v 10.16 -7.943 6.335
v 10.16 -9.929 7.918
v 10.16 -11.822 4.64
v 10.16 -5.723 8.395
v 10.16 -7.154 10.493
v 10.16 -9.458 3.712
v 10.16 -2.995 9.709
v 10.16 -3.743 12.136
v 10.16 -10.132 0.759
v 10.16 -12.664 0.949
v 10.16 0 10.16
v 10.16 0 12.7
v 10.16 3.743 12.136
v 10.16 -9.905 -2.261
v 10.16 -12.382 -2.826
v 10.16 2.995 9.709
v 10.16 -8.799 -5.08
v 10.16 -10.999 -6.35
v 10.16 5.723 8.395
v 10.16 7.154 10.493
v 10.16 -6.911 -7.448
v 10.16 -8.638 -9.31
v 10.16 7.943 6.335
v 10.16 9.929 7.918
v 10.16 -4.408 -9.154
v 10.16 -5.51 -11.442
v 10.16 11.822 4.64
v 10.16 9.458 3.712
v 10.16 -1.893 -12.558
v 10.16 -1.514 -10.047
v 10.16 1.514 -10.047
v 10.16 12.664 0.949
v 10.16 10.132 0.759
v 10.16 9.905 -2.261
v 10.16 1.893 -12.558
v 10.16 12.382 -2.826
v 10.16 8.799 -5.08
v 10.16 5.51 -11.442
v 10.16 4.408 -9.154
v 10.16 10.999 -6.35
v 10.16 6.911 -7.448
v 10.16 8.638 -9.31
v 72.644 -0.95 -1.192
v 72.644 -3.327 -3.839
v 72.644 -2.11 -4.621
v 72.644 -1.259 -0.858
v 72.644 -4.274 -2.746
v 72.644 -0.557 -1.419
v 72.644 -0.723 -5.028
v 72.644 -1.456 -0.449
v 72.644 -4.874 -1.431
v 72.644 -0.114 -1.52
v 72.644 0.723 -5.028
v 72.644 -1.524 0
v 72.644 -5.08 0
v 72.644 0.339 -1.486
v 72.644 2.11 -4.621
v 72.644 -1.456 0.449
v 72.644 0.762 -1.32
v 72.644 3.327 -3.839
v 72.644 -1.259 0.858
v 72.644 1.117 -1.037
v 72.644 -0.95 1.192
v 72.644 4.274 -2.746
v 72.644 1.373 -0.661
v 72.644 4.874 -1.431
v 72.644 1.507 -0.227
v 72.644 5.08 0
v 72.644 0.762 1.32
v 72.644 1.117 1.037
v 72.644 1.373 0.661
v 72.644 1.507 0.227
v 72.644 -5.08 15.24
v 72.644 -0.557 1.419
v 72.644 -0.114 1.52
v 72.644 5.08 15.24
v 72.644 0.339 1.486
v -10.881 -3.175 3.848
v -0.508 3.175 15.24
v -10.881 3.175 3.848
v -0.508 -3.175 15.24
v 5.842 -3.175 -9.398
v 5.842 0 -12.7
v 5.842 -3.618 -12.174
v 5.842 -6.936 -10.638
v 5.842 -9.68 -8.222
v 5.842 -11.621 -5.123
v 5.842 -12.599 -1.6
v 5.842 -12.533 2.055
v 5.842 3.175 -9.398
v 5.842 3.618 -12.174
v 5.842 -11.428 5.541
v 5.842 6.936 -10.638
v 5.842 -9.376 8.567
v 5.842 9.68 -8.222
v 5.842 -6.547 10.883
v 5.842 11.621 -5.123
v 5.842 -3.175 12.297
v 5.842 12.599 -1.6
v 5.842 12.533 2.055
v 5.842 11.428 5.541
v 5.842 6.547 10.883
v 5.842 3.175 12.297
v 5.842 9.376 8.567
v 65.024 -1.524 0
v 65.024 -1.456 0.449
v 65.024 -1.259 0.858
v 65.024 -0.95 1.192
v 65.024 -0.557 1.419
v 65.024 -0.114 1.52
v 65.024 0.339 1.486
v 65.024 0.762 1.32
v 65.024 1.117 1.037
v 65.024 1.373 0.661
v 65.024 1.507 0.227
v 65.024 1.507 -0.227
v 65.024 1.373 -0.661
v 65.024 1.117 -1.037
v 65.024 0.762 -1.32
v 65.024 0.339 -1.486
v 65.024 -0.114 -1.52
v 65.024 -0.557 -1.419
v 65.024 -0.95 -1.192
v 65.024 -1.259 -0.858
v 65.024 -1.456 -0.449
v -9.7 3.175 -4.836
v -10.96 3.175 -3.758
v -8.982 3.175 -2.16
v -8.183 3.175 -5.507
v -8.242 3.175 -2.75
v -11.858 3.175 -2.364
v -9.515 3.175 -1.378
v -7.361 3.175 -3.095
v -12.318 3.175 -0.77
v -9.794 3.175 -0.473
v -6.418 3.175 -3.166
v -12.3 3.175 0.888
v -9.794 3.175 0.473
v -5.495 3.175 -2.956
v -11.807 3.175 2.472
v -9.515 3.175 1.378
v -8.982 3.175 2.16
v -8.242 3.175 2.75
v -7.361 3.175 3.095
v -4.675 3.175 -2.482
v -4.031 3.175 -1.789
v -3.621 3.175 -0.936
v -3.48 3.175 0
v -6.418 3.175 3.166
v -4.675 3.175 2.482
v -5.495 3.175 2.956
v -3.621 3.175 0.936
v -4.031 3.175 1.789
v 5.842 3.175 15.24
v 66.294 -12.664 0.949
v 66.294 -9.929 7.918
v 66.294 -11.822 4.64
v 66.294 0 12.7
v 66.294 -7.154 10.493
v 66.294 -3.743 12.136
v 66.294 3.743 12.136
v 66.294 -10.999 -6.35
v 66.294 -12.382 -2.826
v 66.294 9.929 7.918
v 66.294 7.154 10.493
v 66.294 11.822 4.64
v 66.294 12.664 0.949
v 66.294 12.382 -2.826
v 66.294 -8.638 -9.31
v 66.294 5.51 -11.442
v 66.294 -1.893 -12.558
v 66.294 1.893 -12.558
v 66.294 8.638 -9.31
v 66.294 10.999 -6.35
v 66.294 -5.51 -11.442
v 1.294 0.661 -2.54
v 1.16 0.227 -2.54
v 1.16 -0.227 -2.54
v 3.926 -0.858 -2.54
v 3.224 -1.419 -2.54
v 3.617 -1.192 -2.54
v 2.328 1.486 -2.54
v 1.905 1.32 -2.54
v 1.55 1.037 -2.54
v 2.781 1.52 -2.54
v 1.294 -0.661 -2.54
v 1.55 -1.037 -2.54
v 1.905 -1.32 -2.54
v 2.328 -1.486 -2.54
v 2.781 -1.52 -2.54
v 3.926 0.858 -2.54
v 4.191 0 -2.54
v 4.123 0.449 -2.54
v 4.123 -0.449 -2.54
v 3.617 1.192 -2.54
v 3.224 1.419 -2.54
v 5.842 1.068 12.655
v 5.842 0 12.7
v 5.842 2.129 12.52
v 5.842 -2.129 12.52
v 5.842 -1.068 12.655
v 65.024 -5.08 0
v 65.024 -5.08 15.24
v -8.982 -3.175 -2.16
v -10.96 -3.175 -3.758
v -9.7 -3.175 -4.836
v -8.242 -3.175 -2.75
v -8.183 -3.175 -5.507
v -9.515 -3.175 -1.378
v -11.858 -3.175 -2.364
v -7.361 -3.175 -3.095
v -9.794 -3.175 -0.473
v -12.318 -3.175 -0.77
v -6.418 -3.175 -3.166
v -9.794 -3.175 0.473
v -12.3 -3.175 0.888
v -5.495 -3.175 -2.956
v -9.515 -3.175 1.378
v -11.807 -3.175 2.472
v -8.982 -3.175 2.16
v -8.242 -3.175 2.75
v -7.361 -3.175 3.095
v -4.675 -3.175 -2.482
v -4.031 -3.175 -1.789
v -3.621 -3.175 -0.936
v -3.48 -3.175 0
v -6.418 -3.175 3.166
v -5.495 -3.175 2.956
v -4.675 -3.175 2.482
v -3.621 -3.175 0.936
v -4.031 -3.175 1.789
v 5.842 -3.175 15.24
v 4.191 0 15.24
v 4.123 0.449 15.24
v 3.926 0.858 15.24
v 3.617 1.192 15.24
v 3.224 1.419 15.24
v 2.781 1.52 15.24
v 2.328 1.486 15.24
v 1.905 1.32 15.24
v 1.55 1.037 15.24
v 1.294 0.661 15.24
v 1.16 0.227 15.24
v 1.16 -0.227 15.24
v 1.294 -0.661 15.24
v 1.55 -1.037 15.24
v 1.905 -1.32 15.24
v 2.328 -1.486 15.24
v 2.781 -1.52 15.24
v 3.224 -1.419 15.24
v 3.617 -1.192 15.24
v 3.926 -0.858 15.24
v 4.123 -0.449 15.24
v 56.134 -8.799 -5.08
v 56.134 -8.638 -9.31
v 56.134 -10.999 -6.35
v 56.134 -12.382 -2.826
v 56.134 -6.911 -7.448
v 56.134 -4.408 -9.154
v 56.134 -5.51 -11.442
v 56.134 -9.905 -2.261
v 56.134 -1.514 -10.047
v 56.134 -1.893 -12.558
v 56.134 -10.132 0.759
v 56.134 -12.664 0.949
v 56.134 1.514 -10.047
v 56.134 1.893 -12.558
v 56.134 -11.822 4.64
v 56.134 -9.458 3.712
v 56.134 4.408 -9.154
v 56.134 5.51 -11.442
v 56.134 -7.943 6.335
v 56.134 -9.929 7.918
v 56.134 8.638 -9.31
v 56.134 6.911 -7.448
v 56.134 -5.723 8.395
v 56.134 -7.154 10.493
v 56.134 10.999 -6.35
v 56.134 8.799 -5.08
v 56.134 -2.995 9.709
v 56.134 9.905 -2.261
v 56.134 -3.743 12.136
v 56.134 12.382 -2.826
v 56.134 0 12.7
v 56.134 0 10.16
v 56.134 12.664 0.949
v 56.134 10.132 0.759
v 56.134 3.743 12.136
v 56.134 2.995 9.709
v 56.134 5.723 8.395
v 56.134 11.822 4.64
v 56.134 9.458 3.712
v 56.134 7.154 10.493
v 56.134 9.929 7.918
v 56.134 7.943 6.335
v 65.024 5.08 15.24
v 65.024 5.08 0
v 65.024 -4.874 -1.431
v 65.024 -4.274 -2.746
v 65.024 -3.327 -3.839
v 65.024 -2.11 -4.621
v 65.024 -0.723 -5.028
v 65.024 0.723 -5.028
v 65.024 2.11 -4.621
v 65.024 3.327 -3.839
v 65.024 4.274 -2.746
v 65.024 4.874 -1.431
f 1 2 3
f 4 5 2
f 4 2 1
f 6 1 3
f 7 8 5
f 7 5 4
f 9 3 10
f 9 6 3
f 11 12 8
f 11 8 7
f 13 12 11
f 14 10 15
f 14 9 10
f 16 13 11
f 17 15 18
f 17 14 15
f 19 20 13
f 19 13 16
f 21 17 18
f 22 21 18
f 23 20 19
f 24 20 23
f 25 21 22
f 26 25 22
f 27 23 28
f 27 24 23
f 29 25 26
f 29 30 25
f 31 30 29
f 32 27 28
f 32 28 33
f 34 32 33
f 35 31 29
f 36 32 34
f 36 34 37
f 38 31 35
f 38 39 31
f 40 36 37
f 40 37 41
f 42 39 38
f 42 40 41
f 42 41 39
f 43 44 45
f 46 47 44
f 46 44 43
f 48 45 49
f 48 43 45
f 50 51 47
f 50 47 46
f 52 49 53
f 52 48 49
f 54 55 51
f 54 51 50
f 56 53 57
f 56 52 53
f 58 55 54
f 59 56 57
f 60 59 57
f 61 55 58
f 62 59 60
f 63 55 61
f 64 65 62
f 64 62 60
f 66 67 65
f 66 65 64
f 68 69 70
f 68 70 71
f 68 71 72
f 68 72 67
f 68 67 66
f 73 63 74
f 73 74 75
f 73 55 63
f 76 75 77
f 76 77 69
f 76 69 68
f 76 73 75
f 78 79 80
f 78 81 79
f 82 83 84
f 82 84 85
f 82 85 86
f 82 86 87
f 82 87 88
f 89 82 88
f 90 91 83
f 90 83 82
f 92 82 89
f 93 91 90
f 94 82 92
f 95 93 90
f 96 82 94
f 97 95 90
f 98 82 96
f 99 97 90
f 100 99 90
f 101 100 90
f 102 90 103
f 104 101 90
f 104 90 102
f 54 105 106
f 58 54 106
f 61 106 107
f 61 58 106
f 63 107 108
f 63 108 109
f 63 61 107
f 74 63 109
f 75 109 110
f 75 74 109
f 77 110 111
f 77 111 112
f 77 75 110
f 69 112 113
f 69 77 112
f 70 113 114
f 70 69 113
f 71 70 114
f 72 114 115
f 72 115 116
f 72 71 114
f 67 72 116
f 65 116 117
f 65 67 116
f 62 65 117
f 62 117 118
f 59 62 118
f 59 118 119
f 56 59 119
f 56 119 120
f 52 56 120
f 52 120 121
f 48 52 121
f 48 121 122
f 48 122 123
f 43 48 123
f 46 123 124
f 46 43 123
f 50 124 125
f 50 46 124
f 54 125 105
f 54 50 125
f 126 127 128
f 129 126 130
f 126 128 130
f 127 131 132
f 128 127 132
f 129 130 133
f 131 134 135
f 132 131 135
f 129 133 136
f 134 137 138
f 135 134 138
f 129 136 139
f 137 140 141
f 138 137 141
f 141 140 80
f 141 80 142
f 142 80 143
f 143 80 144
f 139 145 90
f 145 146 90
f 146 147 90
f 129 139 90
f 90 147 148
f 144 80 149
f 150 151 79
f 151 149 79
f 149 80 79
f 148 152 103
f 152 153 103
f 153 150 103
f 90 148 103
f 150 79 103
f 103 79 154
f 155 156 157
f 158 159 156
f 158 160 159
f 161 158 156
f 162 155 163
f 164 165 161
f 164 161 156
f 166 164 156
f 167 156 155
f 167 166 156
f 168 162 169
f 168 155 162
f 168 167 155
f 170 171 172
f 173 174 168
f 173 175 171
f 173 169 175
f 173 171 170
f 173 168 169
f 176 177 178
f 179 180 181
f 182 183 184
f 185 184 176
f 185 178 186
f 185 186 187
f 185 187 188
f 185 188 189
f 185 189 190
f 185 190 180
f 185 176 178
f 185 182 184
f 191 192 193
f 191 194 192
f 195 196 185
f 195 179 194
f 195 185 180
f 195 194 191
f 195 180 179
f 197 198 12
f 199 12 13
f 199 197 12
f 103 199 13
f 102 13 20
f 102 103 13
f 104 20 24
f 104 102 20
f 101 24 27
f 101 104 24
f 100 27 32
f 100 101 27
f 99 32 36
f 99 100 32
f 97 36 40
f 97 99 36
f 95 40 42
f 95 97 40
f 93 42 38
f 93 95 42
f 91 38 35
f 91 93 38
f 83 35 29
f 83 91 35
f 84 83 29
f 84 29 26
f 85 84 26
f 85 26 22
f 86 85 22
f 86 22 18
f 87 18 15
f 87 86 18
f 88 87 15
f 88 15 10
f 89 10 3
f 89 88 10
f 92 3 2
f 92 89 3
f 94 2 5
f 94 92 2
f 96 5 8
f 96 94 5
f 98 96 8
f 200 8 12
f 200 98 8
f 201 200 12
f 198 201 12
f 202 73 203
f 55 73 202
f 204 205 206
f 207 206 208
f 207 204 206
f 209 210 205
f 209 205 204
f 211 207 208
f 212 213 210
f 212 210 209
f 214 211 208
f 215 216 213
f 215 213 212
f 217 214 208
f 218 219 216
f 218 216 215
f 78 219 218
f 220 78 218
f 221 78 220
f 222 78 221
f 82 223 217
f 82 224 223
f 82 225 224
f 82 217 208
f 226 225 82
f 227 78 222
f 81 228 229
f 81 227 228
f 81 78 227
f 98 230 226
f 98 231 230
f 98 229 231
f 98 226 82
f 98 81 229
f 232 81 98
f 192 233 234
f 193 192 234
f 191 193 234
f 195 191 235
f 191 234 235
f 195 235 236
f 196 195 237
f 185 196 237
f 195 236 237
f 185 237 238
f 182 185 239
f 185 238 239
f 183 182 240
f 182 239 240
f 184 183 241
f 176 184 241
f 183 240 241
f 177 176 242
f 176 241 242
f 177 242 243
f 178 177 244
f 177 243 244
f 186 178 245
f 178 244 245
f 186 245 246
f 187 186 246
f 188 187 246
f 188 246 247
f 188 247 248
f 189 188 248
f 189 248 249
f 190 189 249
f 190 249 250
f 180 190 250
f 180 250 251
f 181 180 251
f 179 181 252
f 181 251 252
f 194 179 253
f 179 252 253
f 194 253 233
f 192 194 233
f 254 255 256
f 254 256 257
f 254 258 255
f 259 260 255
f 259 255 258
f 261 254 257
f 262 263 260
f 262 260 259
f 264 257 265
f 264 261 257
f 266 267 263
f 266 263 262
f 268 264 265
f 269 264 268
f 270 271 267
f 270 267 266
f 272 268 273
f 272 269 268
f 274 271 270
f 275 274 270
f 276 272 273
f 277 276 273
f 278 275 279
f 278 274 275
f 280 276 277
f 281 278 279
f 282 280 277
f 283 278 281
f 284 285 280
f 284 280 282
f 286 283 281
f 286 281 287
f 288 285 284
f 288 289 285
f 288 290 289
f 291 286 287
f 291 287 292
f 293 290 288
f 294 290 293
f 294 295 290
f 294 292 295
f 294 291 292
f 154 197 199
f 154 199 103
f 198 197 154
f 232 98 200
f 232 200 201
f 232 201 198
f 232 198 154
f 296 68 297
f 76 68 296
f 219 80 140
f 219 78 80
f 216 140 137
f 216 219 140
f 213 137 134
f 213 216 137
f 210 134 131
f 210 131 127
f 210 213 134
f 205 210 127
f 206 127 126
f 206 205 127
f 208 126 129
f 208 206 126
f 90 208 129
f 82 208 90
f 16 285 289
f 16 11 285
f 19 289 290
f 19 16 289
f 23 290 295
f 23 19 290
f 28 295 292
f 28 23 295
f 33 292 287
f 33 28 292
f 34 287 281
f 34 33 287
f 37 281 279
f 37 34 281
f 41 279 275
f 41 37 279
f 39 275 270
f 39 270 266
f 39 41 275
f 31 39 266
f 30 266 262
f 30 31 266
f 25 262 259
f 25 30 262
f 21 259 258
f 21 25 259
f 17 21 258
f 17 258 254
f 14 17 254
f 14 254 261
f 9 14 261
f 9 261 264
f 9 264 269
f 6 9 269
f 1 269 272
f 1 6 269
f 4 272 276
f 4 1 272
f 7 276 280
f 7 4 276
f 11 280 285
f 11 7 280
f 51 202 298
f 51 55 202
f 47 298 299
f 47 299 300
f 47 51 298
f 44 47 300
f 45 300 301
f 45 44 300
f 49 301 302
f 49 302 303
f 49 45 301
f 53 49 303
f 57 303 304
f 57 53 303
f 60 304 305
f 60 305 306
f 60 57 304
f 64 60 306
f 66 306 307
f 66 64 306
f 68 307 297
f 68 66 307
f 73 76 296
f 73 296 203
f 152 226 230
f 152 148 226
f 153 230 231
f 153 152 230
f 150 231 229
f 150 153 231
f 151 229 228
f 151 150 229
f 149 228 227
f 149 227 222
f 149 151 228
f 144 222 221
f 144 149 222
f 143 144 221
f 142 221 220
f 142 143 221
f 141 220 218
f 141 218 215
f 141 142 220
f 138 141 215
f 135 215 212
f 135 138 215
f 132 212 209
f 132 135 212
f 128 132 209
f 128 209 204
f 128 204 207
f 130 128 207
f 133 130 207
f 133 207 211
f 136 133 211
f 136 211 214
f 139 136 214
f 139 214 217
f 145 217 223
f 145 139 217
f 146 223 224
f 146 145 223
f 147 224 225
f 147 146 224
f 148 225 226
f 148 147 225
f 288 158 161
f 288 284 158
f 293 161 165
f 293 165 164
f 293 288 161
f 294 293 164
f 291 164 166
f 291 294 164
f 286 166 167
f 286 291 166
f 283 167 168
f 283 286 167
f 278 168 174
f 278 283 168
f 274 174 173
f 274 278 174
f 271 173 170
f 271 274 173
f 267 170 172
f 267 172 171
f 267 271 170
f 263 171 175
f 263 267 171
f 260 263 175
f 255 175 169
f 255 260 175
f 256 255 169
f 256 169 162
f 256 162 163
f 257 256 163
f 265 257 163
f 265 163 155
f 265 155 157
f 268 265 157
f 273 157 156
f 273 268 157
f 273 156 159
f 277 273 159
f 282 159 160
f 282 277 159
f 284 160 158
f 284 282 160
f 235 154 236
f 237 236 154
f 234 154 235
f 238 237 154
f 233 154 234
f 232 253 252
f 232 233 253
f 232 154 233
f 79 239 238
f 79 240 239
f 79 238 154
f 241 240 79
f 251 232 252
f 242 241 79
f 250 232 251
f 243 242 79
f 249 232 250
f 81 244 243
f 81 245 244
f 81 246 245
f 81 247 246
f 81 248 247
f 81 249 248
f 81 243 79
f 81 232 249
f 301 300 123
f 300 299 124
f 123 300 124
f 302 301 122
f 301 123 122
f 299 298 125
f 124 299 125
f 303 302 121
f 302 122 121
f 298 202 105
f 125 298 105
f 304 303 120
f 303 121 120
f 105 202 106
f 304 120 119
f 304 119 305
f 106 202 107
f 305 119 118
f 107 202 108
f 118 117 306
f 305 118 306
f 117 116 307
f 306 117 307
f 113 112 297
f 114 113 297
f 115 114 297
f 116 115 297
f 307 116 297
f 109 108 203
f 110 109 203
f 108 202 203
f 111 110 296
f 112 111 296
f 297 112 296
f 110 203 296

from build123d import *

# Parameters (mm, degrees)
F0_W          = 5.842
F0_H          = 12.7
F0_R          = 3.175
F2_DEPTH      = 3.175
F4_R          = 1.524
F5_DEPTH      = 17.78
F6_DEPTH      = 6.35
F6_DEPTH_BACK = 1.27


with BuildPart() as f1:
    # F0 (on Front) → F1 (revolve)
    with BuildSketch(Plane.XZ):
        Polygon((5.842, 12.7), (5.842, 0), (66.294, 0), (66.294, 12.7), (56.134, 12.7), (56.134, 10.16), (10.16, 10.16), (10.16, 12.7), align=None)
    revolve(axis=Axis((33.147, 0, 0), (-1, 0, 0)))

    # F0 (on Front) → F2 (join, symmetric)
    with BuildSketch(Plane.XZ):
        with BuildLine():
            Line((5.842, 0), (0, 0))
            Line((0, 0), (-0.9398, 0))
            ThreePointArc((-0.9398, 0), (-3.1957909266, -4.5493385486), (-8.1826630726, -5.5069827884))
            Line((-8.1826630726, -5.5069827884), (5.842, -9.398))
            Line((5.842, -9.398), (5.842, 0))
        make_face()
        with Locations((2.921, 6.35)):
            Rectangle(F0_W, F0_H)
        with BuildLine():
            Line((-0.9398, 0), (0, 0))
            Line((0, 0), (0, 12.7))
            Line((0, 12.7), (5.842, 12.7))
            Line((5.842, 12.7), (5.842, 15.24))
            Line((5.842, 15.24), (-0.508, 15.24))
            Line((-0.508, 15.24), (-10.8806298187, 3.8475430269))
            ThreePointArc((-10.8806298187, 3.8475430269), (-4.5919612295, 5.3297205562), (-0.9398, 0))
        make_face()
        with BuildLine():
            ThreePointArc((-8.1826630726, -5.5069827884), (-3.1957909266, -4.5493385486), (-0.9398, 0))
            ThreePointArc((-0.9398, 0), (-4.5919612295, 5.3297205562), (-10.8806298187, 3.8475430269))
            ThreePointArc((-10.8806298187, 3.8475430269), (-12.1459778134, -1.5837270034), (-8.1826630726, -5.5069827884))
        make_face()
        with Locations((-6.6548, 0)):
            Circle(F0_R, mode=Mode.SUBTRACT)
    extrude(amount=F2_DEPTH, both=True)

    # F4 (on face) → F5 (cut)
    with BuildSketch(Plane.XY.offset(15.24)):
        with Locations((2.667, 0)):
            Circle(F4_R)
    extrude(amount=-F5_DEPTH, mode=Mode.SUBTRACT)


with BuildPart() as f6:
    # F3 (on face) → F6 (new body, two sides)
    with BuildSketch(Plane.YZ.offset(66.294)) as f6_sk:
        with BuildLine():
            ThreePointArc((-5.08, 0), (0, 5.08), (5.08, 0))
            Line((5.08, 0), (5.08, 11.6397422652))
            ThreePointArc((5.08, 11.6397422652), (0, 12.7), (-5.08, 11.6397422652))
            Line((-5.08, 11.6397422652), (-5.08, 0))
        make_face()
        with BuildLine():
            ThreePointArc((-5.08, 11.6397422652), (0, 12.7), (5.08, 11.6397422652))
            Line((5.08, 11.6397422652), (5.08, 15.24))
            Line((5.08, 15.24), (-5.08, 15.24))
            Line((-5.08, 15.24), (-5.08, 11.6397422652))
        make_face()
        with BuildLine():
            ThreePointArc((-5.08, 0), (0, -5.08), (5.08, 0))
            ThreePointArc((5.08, 0), (0, 5.08), (-5.08, 0))
        make_face()
        with BuildLine():
            ThreePointArc((1.524, 0), (0, -1.524), (-1.524, 0))
            ThreePointArc((-1.524, 0), (0, 1.524), (1.524, 0))
        make_face(mode=Mode.SUBTRACT)
    extrude(amount=F6_DEPTH)
    extrude(f6_sk.sketch, amount=-F6_DEPTH_BACK)


solid = Compound([f1.part, f6.part])
